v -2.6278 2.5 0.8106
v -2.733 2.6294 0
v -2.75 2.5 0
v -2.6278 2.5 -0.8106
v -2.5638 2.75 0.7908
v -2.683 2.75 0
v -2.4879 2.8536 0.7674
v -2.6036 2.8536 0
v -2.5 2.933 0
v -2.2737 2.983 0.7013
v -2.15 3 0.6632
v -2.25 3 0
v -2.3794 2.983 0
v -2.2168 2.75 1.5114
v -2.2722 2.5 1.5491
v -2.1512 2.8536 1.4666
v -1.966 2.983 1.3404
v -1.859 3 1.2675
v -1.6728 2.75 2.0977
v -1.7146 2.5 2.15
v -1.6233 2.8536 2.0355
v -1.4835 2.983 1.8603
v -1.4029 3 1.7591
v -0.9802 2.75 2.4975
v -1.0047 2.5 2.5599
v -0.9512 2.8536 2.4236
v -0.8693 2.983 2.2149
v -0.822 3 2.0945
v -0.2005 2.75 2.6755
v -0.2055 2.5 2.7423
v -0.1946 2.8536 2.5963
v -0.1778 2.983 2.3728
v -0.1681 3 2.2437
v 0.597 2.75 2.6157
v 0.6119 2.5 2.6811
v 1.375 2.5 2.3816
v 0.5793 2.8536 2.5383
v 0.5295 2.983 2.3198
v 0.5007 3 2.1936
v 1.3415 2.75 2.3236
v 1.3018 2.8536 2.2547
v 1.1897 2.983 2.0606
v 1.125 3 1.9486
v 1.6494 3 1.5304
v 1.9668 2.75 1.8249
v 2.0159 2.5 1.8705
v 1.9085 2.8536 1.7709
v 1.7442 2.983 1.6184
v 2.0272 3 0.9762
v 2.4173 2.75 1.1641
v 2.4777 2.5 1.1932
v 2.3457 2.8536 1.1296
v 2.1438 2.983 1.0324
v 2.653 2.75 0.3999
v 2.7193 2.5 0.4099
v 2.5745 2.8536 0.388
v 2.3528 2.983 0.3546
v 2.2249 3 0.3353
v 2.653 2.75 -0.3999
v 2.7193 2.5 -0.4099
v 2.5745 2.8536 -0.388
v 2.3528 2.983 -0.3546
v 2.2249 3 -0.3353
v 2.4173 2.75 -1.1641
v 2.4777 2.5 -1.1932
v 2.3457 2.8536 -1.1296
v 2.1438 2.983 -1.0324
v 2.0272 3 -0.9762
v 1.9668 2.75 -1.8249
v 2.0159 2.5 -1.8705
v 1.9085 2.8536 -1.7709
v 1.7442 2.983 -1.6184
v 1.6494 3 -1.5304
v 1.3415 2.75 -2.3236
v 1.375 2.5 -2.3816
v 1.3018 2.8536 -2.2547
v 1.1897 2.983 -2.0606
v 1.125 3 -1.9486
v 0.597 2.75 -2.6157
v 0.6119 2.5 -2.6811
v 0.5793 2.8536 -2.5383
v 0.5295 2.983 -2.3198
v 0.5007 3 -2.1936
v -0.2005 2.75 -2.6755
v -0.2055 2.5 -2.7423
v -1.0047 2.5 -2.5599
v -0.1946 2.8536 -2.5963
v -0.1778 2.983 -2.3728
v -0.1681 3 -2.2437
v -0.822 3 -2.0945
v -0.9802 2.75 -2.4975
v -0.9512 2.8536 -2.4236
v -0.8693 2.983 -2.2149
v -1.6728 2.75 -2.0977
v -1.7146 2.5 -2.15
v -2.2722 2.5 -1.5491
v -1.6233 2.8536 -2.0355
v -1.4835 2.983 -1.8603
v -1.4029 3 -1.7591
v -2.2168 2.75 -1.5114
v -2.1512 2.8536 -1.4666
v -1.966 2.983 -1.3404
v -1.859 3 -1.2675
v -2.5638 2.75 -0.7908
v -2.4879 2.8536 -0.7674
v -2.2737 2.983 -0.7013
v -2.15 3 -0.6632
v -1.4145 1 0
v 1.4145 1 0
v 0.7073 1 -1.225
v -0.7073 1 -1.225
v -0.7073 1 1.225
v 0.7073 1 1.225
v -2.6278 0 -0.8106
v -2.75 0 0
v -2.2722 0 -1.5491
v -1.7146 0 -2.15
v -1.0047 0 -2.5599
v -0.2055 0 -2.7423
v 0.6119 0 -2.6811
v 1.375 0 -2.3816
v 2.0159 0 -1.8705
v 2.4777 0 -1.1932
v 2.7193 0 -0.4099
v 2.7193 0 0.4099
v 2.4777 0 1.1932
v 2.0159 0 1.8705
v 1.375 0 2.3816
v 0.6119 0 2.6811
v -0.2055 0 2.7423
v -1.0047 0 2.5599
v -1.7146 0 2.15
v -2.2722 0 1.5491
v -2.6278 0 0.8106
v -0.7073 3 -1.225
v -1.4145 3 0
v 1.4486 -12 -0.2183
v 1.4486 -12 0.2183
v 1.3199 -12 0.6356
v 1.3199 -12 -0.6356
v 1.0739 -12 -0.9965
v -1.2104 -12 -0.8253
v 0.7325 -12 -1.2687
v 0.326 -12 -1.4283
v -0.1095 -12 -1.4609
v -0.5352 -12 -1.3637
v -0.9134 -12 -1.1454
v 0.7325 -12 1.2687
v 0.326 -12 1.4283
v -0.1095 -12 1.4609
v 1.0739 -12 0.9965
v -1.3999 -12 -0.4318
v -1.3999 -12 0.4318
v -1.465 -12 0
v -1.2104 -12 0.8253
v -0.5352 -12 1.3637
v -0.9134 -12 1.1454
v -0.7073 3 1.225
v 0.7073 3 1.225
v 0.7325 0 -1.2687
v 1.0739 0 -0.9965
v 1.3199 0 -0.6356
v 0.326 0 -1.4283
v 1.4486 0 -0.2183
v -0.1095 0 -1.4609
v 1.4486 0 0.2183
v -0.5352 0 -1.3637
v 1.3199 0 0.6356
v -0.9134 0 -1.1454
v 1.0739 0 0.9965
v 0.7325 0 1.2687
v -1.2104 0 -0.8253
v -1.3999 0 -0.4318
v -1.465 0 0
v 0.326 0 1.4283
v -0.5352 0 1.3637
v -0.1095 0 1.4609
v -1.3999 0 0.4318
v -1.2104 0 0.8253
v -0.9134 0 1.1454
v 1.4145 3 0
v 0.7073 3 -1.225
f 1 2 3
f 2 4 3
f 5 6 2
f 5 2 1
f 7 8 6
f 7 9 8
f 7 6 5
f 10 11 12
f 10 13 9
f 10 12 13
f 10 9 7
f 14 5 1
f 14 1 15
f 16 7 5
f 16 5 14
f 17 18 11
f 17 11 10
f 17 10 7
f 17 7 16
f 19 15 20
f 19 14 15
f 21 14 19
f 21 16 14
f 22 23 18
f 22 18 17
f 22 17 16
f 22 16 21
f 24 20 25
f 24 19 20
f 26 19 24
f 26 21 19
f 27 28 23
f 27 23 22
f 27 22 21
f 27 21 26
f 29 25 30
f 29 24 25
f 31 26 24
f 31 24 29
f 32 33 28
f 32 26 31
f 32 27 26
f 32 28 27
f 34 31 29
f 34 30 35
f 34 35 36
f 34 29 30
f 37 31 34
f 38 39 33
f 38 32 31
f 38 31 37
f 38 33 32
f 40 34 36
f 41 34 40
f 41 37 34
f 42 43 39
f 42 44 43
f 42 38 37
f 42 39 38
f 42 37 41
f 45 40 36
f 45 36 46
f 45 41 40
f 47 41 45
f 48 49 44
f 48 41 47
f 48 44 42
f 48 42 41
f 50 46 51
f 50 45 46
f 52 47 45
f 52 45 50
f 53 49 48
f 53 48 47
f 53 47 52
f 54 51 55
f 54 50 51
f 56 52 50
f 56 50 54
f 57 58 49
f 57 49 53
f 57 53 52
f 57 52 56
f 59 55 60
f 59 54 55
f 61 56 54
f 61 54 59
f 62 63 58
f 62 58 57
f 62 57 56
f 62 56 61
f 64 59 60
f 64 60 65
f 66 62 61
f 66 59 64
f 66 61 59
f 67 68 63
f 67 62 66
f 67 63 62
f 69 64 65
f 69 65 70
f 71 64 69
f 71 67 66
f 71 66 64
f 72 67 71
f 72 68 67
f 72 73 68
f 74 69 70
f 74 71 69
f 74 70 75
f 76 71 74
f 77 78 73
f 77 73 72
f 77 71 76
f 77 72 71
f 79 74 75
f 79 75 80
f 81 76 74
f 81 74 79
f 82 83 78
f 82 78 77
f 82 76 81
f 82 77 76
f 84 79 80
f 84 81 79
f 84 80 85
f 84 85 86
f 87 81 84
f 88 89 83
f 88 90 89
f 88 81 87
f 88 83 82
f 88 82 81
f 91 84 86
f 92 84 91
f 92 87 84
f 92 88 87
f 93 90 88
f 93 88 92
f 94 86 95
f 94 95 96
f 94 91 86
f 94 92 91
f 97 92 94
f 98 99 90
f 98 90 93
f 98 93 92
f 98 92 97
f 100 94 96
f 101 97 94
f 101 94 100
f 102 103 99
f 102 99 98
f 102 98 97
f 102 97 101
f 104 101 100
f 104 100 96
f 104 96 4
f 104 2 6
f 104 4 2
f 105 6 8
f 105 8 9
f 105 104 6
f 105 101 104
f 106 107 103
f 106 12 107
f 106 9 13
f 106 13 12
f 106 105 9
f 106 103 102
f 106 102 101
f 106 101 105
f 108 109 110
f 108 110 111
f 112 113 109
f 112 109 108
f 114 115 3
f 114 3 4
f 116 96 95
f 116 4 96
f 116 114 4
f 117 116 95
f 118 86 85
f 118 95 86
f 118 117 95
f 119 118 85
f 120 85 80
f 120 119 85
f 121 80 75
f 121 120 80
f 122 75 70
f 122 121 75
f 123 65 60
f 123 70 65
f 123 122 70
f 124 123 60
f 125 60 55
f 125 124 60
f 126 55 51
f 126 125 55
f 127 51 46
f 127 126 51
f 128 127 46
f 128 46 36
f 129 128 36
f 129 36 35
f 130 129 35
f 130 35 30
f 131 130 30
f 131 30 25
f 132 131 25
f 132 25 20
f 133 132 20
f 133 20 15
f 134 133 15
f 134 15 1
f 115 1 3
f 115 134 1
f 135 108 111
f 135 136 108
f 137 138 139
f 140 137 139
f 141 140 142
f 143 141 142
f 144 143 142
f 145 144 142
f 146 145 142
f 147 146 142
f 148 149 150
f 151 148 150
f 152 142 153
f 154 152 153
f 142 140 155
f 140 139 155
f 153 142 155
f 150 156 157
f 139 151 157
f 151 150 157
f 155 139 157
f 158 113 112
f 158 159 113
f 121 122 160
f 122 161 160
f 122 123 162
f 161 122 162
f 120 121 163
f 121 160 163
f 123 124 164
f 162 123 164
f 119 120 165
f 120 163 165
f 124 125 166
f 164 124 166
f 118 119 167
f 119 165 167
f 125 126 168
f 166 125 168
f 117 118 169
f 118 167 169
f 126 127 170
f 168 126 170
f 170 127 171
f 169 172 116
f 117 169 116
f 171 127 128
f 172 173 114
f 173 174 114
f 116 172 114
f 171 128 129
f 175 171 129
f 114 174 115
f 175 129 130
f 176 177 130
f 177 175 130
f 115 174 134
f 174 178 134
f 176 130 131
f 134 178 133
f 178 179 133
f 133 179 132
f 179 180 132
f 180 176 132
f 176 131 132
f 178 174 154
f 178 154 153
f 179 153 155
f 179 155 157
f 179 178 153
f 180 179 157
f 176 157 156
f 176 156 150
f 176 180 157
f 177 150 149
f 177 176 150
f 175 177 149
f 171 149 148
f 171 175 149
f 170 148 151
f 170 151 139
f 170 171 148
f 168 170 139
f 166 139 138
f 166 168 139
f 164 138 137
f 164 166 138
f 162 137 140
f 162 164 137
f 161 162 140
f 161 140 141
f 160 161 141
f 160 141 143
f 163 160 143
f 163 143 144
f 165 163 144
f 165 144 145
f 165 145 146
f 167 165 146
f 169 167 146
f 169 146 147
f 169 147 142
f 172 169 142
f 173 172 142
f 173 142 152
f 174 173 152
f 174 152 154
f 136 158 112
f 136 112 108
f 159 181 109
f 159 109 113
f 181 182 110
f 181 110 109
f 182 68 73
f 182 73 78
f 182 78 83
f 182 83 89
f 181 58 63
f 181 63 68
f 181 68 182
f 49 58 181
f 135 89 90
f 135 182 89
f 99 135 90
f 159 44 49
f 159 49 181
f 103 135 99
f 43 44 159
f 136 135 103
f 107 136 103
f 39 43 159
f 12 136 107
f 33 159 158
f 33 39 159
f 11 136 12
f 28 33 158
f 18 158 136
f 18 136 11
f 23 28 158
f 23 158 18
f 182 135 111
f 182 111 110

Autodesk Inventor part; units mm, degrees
ref_plane "YZ Plane" through (0, 0, 0) normal (1, 0, 0) x (0, 1, 0)
ref_plane "XZ Plane" through (0, 0, 0) normal (0, 1, 0) x (-1, 0, 0)
ref_plane "XY Plane" through (0, 0, 0) normal (0, 0, 1) x (1, 0, 0)
sketch "Sketch1" plane through (0, 0, 0) normal (0, 1, 0) x (-1, 0, 0)
  circle A0 centre (0, 0) radius 1.465
  circle A1 centre (0, 0) radius 2.75
  line L0 (0.7073, -1.225) -> (-0.7073, -1.225)
  line L1 (-0.7073, -1.225) -> (-1.4145, 0)
  line L2 (-1.4145, 0) -> (-0.7073, 1.225)
  line L3 (-0.7073, 1.225) -> (0.7073, 1.225)
  line L4 (0.7073, 1.225) -> (1.4145, 0)
  line L5 (1.4145, 0) -> (0.7073, -1.225)
  dimension "d0" = 2.93
  dimension "d1" = 5.5
  dimension "d8" = 2.45
extrude "Extrusion1" add sketch "Sketch1" along normal blind 3 contours A0 | A1 | L0 L1 L2 L3 L4 L5
extrude "Extrusion2" add sketch "Sketch1" against normal blind 12 contours A0 | L0 L1 L2 L3 L4 L5
extrude "Extrusion3" cut sketch "Sketch1" against normal blind 2 from surface at 3 contours L0 L1 L2 L3 L4 L5
fillet "Fillet1" radius 0.5 1 edges at (2.75, 3, 0)
thread "Thread2" size "M3x0.5" class "6g" standard "ANSI Metric M Profile" full length
equation "\"d4\" = length"
equation "\"length\" = 12"
properties part number "M3x16"
